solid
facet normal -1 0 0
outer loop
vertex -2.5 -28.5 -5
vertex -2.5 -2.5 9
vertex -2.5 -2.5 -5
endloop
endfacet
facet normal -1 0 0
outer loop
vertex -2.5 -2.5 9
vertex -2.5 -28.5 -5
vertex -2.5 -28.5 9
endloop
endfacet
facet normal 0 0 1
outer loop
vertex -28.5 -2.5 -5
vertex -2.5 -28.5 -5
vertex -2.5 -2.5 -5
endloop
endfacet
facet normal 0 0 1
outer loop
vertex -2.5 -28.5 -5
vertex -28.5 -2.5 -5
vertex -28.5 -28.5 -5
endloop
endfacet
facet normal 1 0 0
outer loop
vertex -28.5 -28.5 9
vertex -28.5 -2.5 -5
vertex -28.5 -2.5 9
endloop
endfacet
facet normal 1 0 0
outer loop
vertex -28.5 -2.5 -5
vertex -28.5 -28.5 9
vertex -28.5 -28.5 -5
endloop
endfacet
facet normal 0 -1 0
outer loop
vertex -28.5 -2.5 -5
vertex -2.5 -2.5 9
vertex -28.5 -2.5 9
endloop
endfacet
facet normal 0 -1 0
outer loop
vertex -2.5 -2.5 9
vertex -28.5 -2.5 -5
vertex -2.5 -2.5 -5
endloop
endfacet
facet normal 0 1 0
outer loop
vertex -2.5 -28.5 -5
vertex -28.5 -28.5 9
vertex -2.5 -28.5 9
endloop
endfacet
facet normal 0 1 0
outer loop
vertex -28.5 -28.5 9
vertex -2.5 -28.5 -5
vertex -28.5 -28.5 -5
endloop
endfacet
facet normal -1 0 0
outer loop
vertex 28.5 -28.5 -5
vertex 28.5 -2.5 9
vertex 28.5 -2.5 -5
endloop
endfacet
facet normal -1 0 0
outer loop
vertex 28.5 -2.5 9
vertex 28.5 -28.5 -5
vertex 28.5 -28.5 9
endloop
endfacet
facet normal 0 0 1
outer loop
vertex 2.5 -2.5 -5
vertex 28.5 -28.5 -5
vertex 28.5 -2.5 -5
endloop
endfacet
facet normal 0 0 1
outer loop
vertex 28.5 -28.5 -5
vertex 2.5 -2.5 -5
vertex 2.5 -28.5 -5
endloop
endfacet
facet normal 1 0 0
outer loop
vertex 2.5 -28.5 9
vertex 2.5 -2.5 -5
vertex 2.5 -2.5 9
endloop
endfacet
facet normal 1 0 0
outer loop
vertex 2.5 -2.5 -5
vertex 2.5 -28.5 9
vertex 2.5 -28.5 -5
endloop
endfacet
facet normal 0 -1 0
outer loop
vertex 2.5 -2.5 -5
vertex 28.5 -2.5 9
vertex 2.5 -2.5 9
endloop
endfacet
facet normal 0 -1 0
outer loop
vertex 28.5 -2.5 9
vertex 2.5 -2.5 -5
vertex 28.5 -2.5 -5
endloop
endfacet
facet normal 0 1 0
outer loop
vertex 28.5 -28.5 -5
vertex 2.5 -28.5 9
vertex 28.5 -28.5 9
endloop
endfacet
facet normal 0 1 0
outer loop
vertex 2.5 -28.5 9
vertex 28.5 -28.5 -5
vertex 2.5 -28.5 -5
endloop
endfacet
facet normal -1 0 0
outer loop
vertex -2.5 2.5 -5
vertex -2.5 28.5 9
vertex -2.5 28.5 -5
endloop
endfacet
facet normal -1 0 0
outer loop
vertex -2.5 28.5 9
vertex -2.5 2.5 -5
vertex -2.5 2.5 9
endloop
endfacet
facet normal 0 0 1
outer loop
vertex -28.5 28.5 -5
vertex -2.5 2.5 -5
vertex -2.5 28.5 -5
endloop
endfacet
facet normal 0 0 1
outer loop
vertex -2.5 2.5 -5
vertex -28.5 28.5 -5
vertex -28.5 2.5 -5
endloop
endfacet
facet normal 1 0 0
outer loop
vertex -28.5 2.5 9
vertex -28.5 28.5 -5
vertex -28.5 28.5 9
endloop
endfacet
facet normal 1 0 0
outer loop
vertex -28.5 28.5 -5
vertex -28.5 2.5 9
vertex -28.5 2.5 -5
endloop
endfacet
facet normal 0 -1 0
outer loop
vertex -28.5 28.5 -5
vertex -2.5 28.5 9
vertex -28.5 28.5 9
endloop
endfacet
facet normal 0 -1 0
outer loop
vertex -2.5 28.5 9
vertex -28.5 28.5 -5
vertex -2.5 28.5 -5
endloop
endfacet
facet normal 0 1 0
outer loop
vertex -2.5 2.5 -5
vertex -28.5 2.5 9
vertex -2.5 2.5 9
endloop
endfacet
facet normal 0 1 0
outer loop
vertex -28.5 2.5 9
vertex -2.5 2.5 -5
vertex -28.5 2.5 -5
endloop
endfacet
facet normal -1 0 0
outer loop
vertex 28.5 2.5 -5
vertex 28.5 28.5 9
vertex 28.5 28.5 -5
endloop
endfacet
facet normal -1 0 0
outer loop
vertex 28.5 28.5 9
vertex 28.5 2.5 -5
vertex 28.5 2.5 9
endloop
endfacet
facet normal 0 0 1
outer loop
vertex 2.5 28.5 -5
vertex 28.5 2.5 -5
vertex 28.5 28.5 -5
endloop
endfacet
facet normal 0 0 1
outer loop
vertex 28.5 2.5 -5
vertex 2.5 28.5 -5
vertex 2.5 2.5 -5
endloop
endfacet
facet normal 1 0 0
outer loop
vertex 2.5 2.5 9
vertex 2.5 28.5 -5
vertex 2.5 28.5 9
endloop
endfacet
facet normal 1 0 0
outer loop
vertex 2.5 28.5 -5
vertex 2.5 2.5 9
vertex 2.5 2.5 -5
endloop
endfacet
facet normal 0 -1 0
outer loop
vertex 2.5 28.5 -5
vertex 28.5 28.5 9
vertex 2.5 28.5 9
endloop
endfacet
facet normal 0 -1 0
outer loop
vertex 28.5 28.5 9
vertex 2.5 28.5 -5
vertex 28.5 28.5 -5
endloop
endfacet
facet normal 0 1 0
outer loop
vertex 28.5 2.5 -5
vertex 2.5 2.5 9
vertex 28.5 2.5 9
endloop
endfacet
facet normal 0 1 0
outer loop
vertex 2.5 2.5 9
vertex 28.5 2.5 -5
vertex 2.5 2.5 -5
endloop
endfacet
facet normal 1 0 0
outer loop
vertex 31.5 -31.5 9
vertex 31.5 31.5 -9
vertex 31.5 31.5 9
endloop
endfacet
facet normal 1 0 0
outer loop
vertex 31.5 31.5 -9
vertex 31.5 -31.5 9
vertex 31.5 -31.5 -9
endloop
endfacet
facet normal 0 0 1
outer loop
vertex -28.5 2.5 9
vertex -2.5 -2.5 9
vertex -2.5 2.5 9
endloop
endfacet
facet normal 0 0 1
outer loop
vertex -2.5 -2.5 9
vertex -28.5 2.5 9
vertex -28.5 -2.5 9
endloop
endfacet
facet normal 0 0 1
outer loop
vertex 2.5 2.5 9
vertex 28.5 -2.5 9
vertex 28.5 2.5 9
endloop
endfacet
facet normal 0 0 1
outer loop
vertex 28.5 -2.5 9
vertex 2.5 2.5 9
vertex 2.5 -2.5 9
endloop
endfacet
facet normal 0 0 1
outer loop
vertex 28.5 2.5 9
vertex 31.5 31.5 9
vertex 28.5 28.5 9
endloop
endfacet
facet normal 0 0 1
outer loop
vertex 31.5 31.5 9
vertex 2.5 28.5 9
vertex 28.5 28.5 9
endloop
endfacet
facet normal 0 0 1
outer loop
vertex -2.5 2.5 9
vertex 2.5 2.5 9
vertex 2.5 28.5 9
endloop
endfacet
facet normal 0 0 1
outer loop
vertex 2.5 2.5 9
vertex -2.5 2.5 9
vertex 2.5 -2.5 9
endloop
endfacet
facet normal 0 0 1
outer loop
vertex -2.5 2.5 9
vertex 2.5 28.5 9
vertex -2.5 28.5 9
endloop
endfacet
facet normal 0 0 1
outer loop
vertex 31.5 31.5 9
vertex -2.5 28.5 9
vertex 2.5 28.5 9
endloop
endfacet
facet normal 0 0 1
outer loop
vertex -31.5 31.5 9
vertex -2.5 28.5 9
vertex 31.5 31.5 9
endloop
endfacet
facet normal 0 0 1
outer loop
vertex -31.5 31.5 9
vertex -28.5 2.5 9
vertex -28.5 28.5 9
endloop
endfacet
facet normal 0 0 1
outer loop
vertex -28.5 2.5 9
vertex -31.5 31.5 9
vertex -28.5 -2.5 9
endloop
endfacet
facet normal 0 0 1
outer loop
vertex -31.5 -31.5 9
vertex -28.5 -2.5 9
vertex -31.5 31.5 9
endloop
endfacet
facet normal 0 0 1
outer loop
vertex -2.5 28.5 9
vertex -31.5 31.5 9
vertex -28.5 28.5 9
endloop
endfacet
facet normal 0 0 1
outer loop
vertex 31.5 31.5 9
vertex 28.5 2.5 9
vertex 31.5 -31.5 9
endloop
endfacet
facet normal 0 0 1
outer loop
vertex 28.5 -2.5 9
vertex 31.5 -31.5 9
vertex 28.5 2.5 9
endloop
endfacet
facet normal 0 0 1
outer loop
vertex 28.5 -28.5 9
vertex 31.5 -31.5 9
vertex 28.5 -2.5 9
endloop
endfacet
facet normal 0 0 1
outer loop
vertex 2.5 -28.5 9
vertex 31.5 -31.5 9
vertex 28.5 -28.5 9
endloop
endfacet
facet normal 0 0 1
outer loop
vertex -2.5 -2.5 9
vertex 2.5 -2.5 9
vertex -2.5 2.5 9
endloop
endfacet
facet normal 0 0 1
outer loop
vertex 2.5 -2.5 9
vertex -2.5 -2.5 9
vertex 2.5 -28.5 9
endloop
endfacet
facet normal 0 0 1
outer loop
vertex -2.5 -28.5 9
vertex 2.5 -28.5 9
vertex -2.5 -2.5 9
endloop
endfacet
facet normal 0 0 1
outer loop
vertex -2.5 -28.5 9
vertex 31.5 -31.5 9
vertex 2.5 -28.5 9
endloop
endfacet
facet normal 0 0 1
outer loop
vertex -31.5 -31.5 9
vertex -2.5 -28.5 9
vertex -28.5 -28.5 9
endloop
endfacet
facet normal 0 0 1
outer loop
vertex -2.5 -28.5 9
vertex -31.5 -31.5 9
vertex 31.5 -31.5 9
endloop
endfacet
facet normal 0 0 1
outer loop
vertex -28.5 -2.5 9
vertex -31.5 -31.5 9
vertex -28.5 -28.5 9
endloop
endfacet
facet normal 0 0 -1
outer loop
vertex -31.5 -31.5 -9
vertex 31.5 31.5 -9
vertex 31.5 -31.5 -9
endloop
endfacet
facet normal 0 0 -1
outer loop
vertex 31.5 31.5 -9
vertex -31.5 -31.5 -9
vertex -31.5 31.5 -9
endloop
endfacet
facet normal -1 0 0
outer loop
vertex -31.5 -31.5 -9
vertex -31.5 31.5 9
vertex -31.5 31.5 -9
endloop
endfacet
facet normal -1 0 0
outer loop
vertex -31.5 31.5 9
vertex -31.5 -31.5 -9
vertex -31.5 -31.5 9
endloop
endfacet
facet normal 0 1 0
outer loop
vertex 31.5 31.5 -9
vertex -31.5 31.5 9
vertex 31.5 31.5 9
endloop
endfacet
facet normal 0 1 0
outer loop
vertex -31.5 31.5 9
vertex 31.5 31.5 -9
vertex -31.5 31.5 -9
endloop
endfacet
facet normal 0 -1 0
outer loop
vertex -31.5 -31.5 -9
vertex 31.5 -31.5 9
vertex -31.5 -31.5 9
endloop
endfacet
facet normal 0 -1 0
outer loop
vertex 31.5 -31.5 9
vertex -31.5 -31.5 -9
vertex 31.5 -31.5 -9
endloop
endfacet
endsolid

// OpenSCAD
$fn = 32;

// ----------------------------------------------------------------------
// Pocket plate 63 x 63 x 18
// 2 x 2 pockets 26 mm square, 14 mm deep
// ----------------------------------------------------------------------

// --- parameters (mm) ---
thickness = 18;  // plate thickness
seat_tol = 0.1;  // tolerance at the seating features
free_tol = 0.5;  // general tolerance on the free sizes
floor_t = 4;     // material left under each pocket
pocket = 26;     // pocket side length
pitch_x = 31;    // pocket pitch along X
pitch_y = 31;    // pocket pitch along Y
cols = 2;        // pockets per row
rows = 2;        // rows of pockets

// --- derived feature positions (mm) ---
depth = thickness - floor_t;        // = 14   pocket depth, down to the floor
span_x = (cols - 1) * pitch_x;      // = 31   distance between outer pockets
span_y = (rows - 1) * pitch_y;      // = 31   distance between outer pocket rows
origin_x = -span_x / 2;             // = -15.5   X of the first pocket
origin_y = -span_y / 2;             // = -15.5   Y of the first pocket
plate = [span_x + pocket + 6, span_y + pocket + 6, thickness];  // = [63, 63, 18]   overall size: pockets plus 3 mm of wall on each side
feature_centers = [
  [origin_x + 0 * pitch_x, origin_y + 0 * pitch_y],
  [origin_x + 1 * pitch_x, origin_y + 0 * pitch_y],
  [origin_x + 0 * pitch_x, origin_y + 1 * pitch_y],
  [origin_x + 1 * pitch_x, origin_y + 1 * pitch_y]
];   // pocket centres, used verbatim by the cutter loop

// plate outline, then one pocket per centre in feature_centers
difference() {
  cube(plate, center = true);
  for (centre = feature_centers)
    translate([centre[0] - pocket / 2, centre[1] - pocket / 2, plate[2] / 2 - depth])
      cube([pocket, pocket, depth + 1]);  // centred on the declared pocket centre
}
